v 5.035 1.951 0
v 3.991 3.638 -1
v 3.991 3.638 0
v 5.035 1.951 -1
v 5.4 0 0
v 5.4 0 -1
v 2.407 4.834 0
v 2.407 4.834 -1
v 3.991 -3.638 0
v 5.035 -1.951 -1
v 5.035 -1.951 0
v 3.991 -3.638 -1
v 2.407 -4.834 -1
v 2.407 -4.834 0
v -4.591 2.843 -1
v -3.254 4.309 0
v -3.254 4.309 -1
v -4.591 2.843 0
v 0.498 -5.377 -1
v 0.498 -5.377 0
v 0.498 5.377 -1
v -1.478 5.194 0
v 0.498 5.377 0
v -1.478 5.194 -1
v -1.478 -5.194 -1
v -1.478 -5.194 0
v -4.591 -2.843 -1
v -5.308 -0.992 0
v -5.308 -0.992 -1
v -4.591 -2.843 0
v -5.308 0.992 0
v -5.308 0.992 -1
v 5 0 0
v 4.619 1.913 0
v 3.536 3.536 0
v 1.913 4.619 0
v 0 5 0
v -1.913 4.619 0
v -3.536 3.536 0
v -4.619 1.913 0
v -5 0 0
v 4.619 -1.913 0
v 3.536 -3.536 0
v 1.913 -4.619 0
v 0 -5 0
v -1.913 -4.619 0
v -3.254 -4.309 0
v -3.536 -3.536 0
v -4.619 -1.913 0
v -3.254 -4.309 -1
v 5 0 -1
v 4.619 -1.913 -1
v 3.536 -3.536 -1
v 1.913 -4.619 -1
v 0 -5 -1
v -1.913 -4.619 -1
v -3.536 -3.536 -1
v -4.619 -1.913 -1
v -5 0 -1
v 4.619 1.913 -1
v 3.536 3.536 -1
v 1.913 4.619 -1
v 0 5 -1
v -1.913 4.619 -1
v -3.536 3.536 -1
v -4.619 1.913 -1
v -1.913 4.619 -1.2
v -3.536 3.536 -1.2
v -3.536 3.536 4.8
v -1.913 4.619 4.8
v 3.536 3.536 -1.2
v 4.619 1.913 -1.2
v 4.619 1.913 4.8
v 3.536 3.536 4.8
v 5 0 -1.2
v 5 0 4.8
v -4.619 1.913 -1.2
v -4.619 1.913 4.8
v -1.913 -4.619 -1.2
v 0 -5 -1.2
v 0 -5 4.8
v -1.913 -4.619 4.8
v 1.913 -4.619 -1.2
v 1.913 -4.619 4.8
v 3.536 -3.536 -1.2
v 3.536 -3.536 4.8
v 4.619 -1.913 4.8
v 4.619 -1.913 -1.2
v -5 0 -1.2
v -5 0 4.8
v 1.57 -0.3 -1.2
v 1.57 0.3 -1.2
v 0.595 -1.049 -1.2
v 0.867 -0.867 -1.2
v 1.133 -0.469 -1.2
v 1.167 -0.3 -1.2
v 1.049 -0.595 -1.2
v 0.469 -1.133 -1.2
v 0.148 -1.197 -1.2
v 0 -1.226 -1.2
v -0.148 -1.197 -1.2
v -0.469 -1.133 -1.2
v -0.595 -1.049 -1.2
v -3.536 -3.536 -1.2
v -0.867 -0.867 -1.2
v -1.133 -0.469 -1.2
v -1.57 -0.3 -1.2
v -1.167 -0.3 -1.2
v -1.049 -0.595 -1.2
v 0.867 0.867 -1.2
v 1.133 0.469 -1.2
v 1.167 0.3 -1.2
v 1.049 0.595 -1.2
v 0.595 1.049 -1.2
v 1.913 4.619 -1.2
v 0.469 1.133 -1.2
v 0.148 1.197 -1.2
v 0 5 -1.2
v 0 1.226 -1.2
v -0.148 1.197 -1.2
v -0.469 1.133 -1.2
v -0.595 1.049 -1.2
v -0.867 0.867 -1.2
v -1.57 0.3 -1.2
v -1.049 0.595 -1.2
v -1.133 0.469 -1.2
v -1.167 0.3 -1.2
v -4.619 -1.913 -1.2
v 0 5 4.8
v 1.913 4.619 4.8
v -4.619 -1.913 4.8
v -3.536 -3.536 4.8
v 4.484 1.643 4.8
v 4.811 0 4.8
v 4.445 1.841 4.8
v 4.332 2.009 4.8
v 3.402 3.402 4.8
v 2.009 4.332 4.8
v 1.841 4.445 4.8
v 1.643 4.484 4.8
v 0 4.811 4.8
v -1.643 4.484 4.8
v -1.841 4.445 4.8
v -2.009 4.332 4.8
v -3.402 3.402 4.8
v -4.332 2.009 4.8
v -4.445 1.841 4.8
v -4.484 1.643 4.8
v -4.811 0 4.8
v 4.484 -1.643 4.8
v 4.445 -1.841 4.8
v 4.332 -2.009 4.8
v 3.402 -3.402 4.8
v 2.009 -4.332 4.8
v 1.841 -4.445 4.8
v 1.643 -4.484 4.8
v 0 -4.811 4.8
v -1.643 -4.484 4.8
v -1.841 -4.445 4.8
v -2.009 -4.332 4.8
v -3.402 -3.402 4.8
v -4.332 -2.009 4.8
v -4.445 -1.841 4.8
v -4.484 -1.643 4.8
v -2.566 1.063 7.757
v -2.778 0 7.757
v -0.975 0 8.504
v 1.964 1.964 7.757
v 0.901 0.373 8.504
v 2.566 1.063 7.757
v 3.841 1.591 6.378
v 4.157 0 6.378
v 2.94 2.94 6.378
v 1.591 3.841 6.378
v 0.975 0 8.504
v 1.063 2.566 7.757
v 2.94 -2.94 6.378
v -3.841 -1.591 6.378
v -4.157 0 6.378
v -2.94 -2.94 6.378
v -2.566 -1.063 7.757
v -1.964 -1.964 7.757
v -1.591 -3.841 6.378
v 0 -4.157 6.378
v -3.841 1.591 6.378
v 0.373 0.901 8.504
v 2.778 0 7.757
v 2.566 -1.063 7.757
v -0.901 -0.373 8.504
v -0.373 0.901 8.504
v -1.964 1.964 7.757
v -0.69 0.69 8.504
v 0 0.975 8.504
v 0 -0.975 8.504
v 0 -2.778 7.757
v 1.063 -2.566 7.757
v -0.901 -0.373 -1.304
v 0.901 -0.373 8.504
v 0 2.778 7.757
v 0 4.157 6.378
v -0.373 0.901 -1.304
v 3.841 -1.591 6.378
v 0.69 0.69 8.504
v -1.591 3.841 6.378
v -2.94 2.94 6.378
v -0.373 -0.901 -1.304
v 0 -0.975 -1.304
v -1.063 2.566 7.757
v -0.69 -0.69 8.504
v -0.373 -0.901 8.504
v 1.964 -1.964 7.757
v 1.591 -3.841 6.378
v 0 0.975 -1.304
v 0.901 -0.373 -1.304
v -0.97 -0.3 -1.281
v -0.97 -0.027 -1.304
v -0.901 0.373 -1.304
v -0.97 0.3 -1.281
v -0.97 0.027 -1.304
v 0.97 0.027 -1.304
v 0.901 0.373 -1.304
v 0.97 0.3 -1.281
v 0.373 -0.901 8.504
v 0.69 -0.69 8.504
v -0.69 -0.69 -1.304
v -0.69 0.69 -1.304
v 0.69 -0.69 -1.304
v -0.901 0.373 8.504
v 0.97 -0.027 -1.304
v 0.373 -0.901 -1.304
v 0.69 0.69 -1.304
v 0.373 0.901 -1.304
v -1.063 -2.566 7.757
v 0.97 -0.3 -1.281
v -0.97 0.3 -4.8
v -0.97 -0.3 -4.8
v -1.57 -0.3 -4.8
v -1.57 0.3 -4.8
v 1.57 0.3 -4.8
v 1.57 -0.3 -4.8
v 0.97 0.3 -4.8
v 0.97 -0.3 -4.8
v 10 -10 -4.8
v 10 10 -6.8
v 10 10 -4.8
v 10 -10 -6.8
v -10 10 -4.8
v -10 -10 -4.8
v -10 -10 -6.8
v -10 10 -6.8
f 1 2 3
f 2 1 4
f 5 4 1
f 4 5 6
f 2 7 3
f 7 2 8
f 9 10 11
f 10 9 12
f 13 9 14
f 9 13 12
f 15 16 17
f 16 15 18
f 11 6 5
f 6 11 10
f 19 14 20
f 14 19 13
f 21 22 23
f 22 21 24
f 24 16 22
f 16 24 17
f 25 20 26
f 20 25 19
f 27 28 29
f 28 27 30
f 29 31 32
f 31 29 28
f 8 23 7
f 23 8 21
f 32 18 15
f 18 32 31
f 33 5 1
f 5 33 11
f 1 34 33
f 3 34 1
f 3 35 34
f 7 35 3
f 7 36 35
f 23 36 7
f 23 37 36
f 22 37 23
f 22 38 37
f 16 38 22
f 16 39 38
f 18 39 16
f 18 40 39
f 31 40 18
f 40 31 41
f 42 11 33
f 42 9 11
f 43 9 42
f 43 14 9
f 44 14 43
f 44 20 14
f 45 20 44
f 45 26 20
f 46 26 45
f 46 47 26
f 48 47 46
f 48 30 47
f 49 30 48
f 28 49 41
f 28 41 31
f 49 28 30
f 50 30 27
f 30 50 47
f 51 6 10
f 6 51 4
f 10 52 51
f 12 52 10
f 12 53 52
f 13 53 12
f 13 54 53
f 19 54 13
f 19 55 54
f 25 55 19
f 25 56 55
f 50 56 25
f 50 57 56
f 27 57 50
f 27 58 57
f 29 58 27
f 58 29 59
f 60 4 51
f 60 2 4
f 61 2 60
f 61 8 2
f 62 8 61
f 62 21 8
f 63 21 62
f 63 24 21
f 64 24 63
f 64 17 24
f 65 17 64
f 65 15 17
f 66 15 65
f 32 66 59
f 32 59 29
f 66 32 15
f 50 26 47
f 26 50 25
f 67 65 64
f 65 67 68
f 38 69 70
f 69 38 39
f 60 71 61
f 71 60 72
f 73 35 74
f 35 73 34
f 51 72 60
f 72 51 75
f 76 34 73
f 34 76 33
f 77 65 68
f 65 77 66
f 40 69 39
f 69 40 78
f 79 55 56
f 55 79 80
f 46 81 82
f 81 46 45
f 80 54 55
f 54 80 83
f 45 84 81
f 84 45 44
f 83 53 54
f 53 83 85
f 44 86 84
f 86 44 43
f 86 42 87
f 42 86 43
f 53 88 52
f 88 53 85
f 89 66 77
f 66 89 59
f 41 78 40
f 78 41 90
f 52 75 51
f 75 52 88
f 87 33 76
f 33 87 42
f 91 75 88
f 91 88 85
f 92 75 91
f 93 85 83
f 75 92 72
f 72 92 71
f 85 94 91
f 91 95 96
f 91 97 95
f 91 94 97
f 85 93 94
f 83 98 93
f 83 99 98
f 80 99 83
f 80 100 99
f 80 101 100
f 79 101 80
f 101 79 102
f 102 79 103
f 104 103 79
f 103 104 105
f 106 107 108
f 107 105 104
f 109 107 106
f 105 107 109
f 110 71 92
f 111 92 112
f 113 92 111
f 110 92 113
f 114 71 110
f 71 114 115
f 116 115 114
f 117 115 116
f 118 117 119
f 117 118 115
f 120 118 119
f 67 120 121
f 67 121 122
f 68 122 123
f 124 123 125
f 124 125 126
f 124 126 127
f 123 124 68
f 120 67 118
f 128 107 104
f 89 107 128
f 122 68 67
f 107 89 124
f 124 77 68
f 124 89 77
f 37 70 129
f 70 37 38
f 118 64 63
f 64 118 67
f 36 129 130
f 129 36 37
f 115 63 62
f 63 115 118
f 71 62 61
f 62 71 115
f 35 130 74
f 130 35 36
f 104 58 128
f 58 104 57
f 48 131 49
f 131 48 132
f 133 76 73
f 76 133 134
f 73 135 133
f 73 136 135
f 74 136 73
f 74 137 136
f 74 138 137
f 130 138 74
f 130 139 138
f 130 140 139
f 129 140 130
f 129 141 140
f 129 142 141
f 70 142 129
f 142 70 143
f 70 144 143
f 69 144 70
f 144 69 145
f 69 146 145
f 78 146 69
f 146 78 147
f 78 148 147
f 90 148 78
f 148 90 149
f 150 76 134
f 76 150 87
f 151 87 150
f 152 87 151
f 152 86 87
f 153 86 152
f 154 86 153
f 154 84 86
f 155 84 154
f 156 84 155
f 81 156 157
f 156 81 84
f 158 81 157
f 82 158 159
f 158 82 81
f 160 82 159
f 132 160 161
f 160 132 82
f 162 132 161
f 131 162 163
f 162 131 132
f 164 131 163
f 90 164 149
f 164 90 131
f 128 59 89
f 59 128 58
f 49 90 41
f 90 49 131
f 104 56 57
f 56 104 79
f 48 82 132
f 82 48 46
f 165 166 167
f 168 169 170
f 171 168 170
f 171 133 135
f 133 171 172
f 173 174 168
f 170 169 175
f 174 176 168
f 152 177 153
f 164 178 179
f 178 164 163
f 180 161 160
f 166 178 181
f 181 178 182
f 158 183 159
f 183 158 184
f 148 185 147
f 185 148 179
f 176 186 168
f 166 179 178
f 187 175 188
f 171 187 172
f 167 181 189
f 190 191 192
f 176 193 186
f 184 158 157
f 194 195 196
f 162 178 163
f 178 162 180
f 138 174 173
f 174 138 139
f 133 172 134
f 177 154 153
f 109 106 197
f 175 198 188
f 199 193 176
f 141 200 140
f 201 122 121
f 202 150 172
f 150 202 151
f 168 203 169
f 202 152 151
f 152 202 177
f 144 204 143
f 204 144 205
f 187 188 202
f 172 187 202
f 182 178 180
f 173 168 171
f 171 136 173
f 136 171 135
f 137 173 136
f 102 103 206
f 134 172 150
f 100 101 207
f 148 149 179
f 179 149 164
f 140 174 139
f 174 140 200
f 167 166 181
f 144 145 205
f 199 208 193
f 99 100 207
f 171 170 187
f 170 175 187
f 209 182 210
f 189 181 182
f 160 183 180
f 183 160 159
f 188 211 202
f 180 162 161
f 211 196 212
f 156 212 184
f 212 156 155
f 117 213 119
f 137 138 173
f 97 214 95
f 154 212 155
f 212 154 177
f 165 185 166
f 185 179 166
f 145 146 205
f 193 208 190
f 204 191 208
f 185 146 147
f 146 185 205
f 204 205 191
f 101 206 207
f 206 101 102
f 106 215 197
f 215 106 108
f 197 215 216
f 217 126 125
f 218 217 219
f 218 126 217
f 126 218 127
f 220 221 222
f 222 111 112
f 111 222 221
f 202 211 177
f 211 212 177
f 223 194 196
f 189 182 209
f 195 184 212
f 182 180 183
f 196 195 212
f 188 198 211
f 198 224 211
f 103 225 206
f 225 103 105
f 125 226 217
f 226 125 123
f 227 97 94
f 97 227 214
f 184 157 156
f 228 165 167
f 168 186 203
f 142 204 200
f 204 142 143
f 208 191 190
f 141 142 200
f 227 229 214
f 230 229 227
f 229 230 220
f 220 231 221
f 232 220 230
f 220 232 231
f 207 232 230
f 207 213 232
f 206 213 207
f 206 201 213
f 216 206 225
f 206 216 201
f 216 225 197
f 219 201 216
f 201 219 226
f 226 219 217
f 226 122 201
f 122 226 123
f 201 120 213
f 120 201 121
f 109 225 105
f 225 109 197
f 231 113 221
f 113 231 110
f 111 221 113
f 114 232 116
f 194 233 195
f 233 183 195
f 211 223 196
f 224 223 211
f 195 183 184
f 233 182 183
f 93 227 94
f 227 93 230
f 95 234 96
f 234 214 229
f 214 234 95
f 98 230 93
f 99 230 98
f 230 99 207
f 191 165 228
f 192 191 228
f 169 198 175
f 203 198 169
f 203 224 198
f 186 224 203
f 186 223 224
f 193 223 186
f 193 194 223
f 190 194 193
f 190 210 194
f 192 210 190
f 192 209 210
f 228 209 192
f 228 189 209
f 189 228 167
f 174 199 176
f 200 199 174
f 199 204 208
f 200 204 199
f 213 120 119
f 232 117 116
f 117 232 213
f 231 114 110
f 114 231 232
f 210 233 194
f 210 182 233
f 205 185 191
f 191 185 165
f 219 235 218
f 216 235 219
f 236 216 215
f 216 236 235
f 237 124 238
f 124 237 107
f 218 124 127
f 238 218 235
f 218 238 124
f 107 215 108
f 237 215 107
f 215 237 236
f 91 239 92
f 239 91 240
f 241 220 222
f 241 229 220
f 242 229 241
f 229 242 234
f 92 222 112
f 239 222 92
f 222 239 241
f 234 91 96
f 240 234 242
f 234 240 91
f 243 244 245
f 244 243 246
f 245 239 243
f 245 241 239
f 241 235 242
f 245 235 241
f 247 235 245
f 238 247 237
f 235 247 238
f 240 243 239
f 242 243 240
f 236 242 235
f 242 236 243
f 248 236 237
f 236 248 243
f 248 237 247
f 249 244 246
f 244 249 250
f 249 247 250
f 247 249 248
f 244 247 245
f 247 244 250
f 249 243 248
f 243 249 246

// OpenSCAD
// Parameters
led_diameter_mm = 10.0; //[5.0:20.0:0.1]
body_height_mm = 11.0; //[6.0:22.0:0.1]
rim_thickness_mm = 1.0; //[0.5:2.0:0.1]
rim_diameter_mm = 10.8; //[8.0:21.6:0.1]
lead_pitch_mm = 2.54; //[1.27:5.08:0.01]
lead_thickness_mm = 0.6; //[0.3:1.2:0.05]
lead_length_mm = 5.0; //[2.5:15.0:0.1]
overlap_mm = 1.2; //[0.5:2.0:0.1]  // ensure 1-2mm overlap for robust connectivity
lens_round_radius_mm = 5.0; //[2.5:10.0:0.1]
grill_width_mm = 20.0; //[10.0:60.0:0.5]
grill_height_mm = 20.0; //[10.0:60.0:0.5]
grill_hole_mm = 3.0; //[1.0:8.0:0.1]
grill_gap_mm = 1.0; //[0.5:5.0:0.1]
grill_radius_limit_mm = 1000.0; //[50.0:2000.0:10.0]

// Shared Z references (rim top at z=0, leads go downward)
rim_top_z = 0;
rim_center_z = rim_top_z - rim_thickness_mm/2;
rim_bottom_z = rim_top_z - rim_thickness_mm;

// LED - complete geometry (connected)
module led() {
  // Body sits on rim top with slight overlap into rim
  body_cyl_h = max(0.01, body_height_mm - lens_round_radius_mm);
  body_cyl_center_z = rim_top_z + body_cyl_h/2 - overlap_mm; // overlaps into rim
  body_cyl_top_z = body_cyl_center_z + body_cyl_h/2;

  // Dome sphere centered so its bottom meets cylinder top, with overlap
  dome_center_z = body_cyl_top_z - overlap_mm;

  // Leads: make them long enough to penetrate the mounting plate by overlap_mm
  // Plate top is set to lead_bottom_z + overlap_mm, so to intersect plate we extend leads by overlap_mm.
  lead_h = lead_length_mm + overlap_mm;                 // extend slightly beyond nominal
  lead_top_z = rim_bottom_z + overlap_mm;               // start inside rim for junction
  lead_center_z = lead_top_z - lead_h/2;

  color("red")
  union() {
    // Rim
    translate([0, 0, rim_center_z])
      cylinder(r=rim_diameter_mm/2, h=rim_thickness_mm, center=true);

    // LED Body (cylinder + dome) - attached to rim via overlap
    translate([0, 0, body_cyl_center_z])
      cylinder(r=led_diameter_mm/2, h=body_cyl_h, center=true);

    translate([0, 0, dome_center_z])
      sphere(r=led_diameter_mm/2);

    // Leads - attached to rim and extended to intersect the plate
    translate([-lead_pitch_mm/2, 0, lead_center_z])
      cube([lead_thickness_mm, lead_thickness_mm, lead_h], center=true);

    translate([ lead_pitch_mm/2, 0, lead_center_z])
      cube([lead_thickness_mm, lead_thickness_mm, lead_h], center=true);
  }
}

// Gray mounting plate/board - positioned to physically intersect the lead ends
module mounting_plate() {
  // Compute lead bottom based on the actual lead geometry used in led()
  lead_h = lead_length_mm + overlap_mm;
  lead_top_z = rim_bottom_z + overlap_mm;
  lead_bottom_z = lead_top_z - lead_h;                  // actual bottom of lead solids

  // Make plate thick enough to be a "board" and guarantee overlap with leads
  plate_th = max(2.0, lead_thickness_mm + overlap_mm);  // >=2mm board thickness
  // Place plate so its top is slightly ABOVE the lead bottom -> guaranteed intersection
  plate_top_z = lead_bottom_z + overlap_mm;
  plate_center_z = plate_top_z - plate_th/2;

  color("gray")
  translate([0, 0, plate_center_z])
    cube([grill_width_mm, grill_height_mm, plate_th], center=true);
}

// Assembly (single solid, all parts physically connected)
module assembly() {
  union() {
    led();
    mounting_plate();
  }
}

assembly();
